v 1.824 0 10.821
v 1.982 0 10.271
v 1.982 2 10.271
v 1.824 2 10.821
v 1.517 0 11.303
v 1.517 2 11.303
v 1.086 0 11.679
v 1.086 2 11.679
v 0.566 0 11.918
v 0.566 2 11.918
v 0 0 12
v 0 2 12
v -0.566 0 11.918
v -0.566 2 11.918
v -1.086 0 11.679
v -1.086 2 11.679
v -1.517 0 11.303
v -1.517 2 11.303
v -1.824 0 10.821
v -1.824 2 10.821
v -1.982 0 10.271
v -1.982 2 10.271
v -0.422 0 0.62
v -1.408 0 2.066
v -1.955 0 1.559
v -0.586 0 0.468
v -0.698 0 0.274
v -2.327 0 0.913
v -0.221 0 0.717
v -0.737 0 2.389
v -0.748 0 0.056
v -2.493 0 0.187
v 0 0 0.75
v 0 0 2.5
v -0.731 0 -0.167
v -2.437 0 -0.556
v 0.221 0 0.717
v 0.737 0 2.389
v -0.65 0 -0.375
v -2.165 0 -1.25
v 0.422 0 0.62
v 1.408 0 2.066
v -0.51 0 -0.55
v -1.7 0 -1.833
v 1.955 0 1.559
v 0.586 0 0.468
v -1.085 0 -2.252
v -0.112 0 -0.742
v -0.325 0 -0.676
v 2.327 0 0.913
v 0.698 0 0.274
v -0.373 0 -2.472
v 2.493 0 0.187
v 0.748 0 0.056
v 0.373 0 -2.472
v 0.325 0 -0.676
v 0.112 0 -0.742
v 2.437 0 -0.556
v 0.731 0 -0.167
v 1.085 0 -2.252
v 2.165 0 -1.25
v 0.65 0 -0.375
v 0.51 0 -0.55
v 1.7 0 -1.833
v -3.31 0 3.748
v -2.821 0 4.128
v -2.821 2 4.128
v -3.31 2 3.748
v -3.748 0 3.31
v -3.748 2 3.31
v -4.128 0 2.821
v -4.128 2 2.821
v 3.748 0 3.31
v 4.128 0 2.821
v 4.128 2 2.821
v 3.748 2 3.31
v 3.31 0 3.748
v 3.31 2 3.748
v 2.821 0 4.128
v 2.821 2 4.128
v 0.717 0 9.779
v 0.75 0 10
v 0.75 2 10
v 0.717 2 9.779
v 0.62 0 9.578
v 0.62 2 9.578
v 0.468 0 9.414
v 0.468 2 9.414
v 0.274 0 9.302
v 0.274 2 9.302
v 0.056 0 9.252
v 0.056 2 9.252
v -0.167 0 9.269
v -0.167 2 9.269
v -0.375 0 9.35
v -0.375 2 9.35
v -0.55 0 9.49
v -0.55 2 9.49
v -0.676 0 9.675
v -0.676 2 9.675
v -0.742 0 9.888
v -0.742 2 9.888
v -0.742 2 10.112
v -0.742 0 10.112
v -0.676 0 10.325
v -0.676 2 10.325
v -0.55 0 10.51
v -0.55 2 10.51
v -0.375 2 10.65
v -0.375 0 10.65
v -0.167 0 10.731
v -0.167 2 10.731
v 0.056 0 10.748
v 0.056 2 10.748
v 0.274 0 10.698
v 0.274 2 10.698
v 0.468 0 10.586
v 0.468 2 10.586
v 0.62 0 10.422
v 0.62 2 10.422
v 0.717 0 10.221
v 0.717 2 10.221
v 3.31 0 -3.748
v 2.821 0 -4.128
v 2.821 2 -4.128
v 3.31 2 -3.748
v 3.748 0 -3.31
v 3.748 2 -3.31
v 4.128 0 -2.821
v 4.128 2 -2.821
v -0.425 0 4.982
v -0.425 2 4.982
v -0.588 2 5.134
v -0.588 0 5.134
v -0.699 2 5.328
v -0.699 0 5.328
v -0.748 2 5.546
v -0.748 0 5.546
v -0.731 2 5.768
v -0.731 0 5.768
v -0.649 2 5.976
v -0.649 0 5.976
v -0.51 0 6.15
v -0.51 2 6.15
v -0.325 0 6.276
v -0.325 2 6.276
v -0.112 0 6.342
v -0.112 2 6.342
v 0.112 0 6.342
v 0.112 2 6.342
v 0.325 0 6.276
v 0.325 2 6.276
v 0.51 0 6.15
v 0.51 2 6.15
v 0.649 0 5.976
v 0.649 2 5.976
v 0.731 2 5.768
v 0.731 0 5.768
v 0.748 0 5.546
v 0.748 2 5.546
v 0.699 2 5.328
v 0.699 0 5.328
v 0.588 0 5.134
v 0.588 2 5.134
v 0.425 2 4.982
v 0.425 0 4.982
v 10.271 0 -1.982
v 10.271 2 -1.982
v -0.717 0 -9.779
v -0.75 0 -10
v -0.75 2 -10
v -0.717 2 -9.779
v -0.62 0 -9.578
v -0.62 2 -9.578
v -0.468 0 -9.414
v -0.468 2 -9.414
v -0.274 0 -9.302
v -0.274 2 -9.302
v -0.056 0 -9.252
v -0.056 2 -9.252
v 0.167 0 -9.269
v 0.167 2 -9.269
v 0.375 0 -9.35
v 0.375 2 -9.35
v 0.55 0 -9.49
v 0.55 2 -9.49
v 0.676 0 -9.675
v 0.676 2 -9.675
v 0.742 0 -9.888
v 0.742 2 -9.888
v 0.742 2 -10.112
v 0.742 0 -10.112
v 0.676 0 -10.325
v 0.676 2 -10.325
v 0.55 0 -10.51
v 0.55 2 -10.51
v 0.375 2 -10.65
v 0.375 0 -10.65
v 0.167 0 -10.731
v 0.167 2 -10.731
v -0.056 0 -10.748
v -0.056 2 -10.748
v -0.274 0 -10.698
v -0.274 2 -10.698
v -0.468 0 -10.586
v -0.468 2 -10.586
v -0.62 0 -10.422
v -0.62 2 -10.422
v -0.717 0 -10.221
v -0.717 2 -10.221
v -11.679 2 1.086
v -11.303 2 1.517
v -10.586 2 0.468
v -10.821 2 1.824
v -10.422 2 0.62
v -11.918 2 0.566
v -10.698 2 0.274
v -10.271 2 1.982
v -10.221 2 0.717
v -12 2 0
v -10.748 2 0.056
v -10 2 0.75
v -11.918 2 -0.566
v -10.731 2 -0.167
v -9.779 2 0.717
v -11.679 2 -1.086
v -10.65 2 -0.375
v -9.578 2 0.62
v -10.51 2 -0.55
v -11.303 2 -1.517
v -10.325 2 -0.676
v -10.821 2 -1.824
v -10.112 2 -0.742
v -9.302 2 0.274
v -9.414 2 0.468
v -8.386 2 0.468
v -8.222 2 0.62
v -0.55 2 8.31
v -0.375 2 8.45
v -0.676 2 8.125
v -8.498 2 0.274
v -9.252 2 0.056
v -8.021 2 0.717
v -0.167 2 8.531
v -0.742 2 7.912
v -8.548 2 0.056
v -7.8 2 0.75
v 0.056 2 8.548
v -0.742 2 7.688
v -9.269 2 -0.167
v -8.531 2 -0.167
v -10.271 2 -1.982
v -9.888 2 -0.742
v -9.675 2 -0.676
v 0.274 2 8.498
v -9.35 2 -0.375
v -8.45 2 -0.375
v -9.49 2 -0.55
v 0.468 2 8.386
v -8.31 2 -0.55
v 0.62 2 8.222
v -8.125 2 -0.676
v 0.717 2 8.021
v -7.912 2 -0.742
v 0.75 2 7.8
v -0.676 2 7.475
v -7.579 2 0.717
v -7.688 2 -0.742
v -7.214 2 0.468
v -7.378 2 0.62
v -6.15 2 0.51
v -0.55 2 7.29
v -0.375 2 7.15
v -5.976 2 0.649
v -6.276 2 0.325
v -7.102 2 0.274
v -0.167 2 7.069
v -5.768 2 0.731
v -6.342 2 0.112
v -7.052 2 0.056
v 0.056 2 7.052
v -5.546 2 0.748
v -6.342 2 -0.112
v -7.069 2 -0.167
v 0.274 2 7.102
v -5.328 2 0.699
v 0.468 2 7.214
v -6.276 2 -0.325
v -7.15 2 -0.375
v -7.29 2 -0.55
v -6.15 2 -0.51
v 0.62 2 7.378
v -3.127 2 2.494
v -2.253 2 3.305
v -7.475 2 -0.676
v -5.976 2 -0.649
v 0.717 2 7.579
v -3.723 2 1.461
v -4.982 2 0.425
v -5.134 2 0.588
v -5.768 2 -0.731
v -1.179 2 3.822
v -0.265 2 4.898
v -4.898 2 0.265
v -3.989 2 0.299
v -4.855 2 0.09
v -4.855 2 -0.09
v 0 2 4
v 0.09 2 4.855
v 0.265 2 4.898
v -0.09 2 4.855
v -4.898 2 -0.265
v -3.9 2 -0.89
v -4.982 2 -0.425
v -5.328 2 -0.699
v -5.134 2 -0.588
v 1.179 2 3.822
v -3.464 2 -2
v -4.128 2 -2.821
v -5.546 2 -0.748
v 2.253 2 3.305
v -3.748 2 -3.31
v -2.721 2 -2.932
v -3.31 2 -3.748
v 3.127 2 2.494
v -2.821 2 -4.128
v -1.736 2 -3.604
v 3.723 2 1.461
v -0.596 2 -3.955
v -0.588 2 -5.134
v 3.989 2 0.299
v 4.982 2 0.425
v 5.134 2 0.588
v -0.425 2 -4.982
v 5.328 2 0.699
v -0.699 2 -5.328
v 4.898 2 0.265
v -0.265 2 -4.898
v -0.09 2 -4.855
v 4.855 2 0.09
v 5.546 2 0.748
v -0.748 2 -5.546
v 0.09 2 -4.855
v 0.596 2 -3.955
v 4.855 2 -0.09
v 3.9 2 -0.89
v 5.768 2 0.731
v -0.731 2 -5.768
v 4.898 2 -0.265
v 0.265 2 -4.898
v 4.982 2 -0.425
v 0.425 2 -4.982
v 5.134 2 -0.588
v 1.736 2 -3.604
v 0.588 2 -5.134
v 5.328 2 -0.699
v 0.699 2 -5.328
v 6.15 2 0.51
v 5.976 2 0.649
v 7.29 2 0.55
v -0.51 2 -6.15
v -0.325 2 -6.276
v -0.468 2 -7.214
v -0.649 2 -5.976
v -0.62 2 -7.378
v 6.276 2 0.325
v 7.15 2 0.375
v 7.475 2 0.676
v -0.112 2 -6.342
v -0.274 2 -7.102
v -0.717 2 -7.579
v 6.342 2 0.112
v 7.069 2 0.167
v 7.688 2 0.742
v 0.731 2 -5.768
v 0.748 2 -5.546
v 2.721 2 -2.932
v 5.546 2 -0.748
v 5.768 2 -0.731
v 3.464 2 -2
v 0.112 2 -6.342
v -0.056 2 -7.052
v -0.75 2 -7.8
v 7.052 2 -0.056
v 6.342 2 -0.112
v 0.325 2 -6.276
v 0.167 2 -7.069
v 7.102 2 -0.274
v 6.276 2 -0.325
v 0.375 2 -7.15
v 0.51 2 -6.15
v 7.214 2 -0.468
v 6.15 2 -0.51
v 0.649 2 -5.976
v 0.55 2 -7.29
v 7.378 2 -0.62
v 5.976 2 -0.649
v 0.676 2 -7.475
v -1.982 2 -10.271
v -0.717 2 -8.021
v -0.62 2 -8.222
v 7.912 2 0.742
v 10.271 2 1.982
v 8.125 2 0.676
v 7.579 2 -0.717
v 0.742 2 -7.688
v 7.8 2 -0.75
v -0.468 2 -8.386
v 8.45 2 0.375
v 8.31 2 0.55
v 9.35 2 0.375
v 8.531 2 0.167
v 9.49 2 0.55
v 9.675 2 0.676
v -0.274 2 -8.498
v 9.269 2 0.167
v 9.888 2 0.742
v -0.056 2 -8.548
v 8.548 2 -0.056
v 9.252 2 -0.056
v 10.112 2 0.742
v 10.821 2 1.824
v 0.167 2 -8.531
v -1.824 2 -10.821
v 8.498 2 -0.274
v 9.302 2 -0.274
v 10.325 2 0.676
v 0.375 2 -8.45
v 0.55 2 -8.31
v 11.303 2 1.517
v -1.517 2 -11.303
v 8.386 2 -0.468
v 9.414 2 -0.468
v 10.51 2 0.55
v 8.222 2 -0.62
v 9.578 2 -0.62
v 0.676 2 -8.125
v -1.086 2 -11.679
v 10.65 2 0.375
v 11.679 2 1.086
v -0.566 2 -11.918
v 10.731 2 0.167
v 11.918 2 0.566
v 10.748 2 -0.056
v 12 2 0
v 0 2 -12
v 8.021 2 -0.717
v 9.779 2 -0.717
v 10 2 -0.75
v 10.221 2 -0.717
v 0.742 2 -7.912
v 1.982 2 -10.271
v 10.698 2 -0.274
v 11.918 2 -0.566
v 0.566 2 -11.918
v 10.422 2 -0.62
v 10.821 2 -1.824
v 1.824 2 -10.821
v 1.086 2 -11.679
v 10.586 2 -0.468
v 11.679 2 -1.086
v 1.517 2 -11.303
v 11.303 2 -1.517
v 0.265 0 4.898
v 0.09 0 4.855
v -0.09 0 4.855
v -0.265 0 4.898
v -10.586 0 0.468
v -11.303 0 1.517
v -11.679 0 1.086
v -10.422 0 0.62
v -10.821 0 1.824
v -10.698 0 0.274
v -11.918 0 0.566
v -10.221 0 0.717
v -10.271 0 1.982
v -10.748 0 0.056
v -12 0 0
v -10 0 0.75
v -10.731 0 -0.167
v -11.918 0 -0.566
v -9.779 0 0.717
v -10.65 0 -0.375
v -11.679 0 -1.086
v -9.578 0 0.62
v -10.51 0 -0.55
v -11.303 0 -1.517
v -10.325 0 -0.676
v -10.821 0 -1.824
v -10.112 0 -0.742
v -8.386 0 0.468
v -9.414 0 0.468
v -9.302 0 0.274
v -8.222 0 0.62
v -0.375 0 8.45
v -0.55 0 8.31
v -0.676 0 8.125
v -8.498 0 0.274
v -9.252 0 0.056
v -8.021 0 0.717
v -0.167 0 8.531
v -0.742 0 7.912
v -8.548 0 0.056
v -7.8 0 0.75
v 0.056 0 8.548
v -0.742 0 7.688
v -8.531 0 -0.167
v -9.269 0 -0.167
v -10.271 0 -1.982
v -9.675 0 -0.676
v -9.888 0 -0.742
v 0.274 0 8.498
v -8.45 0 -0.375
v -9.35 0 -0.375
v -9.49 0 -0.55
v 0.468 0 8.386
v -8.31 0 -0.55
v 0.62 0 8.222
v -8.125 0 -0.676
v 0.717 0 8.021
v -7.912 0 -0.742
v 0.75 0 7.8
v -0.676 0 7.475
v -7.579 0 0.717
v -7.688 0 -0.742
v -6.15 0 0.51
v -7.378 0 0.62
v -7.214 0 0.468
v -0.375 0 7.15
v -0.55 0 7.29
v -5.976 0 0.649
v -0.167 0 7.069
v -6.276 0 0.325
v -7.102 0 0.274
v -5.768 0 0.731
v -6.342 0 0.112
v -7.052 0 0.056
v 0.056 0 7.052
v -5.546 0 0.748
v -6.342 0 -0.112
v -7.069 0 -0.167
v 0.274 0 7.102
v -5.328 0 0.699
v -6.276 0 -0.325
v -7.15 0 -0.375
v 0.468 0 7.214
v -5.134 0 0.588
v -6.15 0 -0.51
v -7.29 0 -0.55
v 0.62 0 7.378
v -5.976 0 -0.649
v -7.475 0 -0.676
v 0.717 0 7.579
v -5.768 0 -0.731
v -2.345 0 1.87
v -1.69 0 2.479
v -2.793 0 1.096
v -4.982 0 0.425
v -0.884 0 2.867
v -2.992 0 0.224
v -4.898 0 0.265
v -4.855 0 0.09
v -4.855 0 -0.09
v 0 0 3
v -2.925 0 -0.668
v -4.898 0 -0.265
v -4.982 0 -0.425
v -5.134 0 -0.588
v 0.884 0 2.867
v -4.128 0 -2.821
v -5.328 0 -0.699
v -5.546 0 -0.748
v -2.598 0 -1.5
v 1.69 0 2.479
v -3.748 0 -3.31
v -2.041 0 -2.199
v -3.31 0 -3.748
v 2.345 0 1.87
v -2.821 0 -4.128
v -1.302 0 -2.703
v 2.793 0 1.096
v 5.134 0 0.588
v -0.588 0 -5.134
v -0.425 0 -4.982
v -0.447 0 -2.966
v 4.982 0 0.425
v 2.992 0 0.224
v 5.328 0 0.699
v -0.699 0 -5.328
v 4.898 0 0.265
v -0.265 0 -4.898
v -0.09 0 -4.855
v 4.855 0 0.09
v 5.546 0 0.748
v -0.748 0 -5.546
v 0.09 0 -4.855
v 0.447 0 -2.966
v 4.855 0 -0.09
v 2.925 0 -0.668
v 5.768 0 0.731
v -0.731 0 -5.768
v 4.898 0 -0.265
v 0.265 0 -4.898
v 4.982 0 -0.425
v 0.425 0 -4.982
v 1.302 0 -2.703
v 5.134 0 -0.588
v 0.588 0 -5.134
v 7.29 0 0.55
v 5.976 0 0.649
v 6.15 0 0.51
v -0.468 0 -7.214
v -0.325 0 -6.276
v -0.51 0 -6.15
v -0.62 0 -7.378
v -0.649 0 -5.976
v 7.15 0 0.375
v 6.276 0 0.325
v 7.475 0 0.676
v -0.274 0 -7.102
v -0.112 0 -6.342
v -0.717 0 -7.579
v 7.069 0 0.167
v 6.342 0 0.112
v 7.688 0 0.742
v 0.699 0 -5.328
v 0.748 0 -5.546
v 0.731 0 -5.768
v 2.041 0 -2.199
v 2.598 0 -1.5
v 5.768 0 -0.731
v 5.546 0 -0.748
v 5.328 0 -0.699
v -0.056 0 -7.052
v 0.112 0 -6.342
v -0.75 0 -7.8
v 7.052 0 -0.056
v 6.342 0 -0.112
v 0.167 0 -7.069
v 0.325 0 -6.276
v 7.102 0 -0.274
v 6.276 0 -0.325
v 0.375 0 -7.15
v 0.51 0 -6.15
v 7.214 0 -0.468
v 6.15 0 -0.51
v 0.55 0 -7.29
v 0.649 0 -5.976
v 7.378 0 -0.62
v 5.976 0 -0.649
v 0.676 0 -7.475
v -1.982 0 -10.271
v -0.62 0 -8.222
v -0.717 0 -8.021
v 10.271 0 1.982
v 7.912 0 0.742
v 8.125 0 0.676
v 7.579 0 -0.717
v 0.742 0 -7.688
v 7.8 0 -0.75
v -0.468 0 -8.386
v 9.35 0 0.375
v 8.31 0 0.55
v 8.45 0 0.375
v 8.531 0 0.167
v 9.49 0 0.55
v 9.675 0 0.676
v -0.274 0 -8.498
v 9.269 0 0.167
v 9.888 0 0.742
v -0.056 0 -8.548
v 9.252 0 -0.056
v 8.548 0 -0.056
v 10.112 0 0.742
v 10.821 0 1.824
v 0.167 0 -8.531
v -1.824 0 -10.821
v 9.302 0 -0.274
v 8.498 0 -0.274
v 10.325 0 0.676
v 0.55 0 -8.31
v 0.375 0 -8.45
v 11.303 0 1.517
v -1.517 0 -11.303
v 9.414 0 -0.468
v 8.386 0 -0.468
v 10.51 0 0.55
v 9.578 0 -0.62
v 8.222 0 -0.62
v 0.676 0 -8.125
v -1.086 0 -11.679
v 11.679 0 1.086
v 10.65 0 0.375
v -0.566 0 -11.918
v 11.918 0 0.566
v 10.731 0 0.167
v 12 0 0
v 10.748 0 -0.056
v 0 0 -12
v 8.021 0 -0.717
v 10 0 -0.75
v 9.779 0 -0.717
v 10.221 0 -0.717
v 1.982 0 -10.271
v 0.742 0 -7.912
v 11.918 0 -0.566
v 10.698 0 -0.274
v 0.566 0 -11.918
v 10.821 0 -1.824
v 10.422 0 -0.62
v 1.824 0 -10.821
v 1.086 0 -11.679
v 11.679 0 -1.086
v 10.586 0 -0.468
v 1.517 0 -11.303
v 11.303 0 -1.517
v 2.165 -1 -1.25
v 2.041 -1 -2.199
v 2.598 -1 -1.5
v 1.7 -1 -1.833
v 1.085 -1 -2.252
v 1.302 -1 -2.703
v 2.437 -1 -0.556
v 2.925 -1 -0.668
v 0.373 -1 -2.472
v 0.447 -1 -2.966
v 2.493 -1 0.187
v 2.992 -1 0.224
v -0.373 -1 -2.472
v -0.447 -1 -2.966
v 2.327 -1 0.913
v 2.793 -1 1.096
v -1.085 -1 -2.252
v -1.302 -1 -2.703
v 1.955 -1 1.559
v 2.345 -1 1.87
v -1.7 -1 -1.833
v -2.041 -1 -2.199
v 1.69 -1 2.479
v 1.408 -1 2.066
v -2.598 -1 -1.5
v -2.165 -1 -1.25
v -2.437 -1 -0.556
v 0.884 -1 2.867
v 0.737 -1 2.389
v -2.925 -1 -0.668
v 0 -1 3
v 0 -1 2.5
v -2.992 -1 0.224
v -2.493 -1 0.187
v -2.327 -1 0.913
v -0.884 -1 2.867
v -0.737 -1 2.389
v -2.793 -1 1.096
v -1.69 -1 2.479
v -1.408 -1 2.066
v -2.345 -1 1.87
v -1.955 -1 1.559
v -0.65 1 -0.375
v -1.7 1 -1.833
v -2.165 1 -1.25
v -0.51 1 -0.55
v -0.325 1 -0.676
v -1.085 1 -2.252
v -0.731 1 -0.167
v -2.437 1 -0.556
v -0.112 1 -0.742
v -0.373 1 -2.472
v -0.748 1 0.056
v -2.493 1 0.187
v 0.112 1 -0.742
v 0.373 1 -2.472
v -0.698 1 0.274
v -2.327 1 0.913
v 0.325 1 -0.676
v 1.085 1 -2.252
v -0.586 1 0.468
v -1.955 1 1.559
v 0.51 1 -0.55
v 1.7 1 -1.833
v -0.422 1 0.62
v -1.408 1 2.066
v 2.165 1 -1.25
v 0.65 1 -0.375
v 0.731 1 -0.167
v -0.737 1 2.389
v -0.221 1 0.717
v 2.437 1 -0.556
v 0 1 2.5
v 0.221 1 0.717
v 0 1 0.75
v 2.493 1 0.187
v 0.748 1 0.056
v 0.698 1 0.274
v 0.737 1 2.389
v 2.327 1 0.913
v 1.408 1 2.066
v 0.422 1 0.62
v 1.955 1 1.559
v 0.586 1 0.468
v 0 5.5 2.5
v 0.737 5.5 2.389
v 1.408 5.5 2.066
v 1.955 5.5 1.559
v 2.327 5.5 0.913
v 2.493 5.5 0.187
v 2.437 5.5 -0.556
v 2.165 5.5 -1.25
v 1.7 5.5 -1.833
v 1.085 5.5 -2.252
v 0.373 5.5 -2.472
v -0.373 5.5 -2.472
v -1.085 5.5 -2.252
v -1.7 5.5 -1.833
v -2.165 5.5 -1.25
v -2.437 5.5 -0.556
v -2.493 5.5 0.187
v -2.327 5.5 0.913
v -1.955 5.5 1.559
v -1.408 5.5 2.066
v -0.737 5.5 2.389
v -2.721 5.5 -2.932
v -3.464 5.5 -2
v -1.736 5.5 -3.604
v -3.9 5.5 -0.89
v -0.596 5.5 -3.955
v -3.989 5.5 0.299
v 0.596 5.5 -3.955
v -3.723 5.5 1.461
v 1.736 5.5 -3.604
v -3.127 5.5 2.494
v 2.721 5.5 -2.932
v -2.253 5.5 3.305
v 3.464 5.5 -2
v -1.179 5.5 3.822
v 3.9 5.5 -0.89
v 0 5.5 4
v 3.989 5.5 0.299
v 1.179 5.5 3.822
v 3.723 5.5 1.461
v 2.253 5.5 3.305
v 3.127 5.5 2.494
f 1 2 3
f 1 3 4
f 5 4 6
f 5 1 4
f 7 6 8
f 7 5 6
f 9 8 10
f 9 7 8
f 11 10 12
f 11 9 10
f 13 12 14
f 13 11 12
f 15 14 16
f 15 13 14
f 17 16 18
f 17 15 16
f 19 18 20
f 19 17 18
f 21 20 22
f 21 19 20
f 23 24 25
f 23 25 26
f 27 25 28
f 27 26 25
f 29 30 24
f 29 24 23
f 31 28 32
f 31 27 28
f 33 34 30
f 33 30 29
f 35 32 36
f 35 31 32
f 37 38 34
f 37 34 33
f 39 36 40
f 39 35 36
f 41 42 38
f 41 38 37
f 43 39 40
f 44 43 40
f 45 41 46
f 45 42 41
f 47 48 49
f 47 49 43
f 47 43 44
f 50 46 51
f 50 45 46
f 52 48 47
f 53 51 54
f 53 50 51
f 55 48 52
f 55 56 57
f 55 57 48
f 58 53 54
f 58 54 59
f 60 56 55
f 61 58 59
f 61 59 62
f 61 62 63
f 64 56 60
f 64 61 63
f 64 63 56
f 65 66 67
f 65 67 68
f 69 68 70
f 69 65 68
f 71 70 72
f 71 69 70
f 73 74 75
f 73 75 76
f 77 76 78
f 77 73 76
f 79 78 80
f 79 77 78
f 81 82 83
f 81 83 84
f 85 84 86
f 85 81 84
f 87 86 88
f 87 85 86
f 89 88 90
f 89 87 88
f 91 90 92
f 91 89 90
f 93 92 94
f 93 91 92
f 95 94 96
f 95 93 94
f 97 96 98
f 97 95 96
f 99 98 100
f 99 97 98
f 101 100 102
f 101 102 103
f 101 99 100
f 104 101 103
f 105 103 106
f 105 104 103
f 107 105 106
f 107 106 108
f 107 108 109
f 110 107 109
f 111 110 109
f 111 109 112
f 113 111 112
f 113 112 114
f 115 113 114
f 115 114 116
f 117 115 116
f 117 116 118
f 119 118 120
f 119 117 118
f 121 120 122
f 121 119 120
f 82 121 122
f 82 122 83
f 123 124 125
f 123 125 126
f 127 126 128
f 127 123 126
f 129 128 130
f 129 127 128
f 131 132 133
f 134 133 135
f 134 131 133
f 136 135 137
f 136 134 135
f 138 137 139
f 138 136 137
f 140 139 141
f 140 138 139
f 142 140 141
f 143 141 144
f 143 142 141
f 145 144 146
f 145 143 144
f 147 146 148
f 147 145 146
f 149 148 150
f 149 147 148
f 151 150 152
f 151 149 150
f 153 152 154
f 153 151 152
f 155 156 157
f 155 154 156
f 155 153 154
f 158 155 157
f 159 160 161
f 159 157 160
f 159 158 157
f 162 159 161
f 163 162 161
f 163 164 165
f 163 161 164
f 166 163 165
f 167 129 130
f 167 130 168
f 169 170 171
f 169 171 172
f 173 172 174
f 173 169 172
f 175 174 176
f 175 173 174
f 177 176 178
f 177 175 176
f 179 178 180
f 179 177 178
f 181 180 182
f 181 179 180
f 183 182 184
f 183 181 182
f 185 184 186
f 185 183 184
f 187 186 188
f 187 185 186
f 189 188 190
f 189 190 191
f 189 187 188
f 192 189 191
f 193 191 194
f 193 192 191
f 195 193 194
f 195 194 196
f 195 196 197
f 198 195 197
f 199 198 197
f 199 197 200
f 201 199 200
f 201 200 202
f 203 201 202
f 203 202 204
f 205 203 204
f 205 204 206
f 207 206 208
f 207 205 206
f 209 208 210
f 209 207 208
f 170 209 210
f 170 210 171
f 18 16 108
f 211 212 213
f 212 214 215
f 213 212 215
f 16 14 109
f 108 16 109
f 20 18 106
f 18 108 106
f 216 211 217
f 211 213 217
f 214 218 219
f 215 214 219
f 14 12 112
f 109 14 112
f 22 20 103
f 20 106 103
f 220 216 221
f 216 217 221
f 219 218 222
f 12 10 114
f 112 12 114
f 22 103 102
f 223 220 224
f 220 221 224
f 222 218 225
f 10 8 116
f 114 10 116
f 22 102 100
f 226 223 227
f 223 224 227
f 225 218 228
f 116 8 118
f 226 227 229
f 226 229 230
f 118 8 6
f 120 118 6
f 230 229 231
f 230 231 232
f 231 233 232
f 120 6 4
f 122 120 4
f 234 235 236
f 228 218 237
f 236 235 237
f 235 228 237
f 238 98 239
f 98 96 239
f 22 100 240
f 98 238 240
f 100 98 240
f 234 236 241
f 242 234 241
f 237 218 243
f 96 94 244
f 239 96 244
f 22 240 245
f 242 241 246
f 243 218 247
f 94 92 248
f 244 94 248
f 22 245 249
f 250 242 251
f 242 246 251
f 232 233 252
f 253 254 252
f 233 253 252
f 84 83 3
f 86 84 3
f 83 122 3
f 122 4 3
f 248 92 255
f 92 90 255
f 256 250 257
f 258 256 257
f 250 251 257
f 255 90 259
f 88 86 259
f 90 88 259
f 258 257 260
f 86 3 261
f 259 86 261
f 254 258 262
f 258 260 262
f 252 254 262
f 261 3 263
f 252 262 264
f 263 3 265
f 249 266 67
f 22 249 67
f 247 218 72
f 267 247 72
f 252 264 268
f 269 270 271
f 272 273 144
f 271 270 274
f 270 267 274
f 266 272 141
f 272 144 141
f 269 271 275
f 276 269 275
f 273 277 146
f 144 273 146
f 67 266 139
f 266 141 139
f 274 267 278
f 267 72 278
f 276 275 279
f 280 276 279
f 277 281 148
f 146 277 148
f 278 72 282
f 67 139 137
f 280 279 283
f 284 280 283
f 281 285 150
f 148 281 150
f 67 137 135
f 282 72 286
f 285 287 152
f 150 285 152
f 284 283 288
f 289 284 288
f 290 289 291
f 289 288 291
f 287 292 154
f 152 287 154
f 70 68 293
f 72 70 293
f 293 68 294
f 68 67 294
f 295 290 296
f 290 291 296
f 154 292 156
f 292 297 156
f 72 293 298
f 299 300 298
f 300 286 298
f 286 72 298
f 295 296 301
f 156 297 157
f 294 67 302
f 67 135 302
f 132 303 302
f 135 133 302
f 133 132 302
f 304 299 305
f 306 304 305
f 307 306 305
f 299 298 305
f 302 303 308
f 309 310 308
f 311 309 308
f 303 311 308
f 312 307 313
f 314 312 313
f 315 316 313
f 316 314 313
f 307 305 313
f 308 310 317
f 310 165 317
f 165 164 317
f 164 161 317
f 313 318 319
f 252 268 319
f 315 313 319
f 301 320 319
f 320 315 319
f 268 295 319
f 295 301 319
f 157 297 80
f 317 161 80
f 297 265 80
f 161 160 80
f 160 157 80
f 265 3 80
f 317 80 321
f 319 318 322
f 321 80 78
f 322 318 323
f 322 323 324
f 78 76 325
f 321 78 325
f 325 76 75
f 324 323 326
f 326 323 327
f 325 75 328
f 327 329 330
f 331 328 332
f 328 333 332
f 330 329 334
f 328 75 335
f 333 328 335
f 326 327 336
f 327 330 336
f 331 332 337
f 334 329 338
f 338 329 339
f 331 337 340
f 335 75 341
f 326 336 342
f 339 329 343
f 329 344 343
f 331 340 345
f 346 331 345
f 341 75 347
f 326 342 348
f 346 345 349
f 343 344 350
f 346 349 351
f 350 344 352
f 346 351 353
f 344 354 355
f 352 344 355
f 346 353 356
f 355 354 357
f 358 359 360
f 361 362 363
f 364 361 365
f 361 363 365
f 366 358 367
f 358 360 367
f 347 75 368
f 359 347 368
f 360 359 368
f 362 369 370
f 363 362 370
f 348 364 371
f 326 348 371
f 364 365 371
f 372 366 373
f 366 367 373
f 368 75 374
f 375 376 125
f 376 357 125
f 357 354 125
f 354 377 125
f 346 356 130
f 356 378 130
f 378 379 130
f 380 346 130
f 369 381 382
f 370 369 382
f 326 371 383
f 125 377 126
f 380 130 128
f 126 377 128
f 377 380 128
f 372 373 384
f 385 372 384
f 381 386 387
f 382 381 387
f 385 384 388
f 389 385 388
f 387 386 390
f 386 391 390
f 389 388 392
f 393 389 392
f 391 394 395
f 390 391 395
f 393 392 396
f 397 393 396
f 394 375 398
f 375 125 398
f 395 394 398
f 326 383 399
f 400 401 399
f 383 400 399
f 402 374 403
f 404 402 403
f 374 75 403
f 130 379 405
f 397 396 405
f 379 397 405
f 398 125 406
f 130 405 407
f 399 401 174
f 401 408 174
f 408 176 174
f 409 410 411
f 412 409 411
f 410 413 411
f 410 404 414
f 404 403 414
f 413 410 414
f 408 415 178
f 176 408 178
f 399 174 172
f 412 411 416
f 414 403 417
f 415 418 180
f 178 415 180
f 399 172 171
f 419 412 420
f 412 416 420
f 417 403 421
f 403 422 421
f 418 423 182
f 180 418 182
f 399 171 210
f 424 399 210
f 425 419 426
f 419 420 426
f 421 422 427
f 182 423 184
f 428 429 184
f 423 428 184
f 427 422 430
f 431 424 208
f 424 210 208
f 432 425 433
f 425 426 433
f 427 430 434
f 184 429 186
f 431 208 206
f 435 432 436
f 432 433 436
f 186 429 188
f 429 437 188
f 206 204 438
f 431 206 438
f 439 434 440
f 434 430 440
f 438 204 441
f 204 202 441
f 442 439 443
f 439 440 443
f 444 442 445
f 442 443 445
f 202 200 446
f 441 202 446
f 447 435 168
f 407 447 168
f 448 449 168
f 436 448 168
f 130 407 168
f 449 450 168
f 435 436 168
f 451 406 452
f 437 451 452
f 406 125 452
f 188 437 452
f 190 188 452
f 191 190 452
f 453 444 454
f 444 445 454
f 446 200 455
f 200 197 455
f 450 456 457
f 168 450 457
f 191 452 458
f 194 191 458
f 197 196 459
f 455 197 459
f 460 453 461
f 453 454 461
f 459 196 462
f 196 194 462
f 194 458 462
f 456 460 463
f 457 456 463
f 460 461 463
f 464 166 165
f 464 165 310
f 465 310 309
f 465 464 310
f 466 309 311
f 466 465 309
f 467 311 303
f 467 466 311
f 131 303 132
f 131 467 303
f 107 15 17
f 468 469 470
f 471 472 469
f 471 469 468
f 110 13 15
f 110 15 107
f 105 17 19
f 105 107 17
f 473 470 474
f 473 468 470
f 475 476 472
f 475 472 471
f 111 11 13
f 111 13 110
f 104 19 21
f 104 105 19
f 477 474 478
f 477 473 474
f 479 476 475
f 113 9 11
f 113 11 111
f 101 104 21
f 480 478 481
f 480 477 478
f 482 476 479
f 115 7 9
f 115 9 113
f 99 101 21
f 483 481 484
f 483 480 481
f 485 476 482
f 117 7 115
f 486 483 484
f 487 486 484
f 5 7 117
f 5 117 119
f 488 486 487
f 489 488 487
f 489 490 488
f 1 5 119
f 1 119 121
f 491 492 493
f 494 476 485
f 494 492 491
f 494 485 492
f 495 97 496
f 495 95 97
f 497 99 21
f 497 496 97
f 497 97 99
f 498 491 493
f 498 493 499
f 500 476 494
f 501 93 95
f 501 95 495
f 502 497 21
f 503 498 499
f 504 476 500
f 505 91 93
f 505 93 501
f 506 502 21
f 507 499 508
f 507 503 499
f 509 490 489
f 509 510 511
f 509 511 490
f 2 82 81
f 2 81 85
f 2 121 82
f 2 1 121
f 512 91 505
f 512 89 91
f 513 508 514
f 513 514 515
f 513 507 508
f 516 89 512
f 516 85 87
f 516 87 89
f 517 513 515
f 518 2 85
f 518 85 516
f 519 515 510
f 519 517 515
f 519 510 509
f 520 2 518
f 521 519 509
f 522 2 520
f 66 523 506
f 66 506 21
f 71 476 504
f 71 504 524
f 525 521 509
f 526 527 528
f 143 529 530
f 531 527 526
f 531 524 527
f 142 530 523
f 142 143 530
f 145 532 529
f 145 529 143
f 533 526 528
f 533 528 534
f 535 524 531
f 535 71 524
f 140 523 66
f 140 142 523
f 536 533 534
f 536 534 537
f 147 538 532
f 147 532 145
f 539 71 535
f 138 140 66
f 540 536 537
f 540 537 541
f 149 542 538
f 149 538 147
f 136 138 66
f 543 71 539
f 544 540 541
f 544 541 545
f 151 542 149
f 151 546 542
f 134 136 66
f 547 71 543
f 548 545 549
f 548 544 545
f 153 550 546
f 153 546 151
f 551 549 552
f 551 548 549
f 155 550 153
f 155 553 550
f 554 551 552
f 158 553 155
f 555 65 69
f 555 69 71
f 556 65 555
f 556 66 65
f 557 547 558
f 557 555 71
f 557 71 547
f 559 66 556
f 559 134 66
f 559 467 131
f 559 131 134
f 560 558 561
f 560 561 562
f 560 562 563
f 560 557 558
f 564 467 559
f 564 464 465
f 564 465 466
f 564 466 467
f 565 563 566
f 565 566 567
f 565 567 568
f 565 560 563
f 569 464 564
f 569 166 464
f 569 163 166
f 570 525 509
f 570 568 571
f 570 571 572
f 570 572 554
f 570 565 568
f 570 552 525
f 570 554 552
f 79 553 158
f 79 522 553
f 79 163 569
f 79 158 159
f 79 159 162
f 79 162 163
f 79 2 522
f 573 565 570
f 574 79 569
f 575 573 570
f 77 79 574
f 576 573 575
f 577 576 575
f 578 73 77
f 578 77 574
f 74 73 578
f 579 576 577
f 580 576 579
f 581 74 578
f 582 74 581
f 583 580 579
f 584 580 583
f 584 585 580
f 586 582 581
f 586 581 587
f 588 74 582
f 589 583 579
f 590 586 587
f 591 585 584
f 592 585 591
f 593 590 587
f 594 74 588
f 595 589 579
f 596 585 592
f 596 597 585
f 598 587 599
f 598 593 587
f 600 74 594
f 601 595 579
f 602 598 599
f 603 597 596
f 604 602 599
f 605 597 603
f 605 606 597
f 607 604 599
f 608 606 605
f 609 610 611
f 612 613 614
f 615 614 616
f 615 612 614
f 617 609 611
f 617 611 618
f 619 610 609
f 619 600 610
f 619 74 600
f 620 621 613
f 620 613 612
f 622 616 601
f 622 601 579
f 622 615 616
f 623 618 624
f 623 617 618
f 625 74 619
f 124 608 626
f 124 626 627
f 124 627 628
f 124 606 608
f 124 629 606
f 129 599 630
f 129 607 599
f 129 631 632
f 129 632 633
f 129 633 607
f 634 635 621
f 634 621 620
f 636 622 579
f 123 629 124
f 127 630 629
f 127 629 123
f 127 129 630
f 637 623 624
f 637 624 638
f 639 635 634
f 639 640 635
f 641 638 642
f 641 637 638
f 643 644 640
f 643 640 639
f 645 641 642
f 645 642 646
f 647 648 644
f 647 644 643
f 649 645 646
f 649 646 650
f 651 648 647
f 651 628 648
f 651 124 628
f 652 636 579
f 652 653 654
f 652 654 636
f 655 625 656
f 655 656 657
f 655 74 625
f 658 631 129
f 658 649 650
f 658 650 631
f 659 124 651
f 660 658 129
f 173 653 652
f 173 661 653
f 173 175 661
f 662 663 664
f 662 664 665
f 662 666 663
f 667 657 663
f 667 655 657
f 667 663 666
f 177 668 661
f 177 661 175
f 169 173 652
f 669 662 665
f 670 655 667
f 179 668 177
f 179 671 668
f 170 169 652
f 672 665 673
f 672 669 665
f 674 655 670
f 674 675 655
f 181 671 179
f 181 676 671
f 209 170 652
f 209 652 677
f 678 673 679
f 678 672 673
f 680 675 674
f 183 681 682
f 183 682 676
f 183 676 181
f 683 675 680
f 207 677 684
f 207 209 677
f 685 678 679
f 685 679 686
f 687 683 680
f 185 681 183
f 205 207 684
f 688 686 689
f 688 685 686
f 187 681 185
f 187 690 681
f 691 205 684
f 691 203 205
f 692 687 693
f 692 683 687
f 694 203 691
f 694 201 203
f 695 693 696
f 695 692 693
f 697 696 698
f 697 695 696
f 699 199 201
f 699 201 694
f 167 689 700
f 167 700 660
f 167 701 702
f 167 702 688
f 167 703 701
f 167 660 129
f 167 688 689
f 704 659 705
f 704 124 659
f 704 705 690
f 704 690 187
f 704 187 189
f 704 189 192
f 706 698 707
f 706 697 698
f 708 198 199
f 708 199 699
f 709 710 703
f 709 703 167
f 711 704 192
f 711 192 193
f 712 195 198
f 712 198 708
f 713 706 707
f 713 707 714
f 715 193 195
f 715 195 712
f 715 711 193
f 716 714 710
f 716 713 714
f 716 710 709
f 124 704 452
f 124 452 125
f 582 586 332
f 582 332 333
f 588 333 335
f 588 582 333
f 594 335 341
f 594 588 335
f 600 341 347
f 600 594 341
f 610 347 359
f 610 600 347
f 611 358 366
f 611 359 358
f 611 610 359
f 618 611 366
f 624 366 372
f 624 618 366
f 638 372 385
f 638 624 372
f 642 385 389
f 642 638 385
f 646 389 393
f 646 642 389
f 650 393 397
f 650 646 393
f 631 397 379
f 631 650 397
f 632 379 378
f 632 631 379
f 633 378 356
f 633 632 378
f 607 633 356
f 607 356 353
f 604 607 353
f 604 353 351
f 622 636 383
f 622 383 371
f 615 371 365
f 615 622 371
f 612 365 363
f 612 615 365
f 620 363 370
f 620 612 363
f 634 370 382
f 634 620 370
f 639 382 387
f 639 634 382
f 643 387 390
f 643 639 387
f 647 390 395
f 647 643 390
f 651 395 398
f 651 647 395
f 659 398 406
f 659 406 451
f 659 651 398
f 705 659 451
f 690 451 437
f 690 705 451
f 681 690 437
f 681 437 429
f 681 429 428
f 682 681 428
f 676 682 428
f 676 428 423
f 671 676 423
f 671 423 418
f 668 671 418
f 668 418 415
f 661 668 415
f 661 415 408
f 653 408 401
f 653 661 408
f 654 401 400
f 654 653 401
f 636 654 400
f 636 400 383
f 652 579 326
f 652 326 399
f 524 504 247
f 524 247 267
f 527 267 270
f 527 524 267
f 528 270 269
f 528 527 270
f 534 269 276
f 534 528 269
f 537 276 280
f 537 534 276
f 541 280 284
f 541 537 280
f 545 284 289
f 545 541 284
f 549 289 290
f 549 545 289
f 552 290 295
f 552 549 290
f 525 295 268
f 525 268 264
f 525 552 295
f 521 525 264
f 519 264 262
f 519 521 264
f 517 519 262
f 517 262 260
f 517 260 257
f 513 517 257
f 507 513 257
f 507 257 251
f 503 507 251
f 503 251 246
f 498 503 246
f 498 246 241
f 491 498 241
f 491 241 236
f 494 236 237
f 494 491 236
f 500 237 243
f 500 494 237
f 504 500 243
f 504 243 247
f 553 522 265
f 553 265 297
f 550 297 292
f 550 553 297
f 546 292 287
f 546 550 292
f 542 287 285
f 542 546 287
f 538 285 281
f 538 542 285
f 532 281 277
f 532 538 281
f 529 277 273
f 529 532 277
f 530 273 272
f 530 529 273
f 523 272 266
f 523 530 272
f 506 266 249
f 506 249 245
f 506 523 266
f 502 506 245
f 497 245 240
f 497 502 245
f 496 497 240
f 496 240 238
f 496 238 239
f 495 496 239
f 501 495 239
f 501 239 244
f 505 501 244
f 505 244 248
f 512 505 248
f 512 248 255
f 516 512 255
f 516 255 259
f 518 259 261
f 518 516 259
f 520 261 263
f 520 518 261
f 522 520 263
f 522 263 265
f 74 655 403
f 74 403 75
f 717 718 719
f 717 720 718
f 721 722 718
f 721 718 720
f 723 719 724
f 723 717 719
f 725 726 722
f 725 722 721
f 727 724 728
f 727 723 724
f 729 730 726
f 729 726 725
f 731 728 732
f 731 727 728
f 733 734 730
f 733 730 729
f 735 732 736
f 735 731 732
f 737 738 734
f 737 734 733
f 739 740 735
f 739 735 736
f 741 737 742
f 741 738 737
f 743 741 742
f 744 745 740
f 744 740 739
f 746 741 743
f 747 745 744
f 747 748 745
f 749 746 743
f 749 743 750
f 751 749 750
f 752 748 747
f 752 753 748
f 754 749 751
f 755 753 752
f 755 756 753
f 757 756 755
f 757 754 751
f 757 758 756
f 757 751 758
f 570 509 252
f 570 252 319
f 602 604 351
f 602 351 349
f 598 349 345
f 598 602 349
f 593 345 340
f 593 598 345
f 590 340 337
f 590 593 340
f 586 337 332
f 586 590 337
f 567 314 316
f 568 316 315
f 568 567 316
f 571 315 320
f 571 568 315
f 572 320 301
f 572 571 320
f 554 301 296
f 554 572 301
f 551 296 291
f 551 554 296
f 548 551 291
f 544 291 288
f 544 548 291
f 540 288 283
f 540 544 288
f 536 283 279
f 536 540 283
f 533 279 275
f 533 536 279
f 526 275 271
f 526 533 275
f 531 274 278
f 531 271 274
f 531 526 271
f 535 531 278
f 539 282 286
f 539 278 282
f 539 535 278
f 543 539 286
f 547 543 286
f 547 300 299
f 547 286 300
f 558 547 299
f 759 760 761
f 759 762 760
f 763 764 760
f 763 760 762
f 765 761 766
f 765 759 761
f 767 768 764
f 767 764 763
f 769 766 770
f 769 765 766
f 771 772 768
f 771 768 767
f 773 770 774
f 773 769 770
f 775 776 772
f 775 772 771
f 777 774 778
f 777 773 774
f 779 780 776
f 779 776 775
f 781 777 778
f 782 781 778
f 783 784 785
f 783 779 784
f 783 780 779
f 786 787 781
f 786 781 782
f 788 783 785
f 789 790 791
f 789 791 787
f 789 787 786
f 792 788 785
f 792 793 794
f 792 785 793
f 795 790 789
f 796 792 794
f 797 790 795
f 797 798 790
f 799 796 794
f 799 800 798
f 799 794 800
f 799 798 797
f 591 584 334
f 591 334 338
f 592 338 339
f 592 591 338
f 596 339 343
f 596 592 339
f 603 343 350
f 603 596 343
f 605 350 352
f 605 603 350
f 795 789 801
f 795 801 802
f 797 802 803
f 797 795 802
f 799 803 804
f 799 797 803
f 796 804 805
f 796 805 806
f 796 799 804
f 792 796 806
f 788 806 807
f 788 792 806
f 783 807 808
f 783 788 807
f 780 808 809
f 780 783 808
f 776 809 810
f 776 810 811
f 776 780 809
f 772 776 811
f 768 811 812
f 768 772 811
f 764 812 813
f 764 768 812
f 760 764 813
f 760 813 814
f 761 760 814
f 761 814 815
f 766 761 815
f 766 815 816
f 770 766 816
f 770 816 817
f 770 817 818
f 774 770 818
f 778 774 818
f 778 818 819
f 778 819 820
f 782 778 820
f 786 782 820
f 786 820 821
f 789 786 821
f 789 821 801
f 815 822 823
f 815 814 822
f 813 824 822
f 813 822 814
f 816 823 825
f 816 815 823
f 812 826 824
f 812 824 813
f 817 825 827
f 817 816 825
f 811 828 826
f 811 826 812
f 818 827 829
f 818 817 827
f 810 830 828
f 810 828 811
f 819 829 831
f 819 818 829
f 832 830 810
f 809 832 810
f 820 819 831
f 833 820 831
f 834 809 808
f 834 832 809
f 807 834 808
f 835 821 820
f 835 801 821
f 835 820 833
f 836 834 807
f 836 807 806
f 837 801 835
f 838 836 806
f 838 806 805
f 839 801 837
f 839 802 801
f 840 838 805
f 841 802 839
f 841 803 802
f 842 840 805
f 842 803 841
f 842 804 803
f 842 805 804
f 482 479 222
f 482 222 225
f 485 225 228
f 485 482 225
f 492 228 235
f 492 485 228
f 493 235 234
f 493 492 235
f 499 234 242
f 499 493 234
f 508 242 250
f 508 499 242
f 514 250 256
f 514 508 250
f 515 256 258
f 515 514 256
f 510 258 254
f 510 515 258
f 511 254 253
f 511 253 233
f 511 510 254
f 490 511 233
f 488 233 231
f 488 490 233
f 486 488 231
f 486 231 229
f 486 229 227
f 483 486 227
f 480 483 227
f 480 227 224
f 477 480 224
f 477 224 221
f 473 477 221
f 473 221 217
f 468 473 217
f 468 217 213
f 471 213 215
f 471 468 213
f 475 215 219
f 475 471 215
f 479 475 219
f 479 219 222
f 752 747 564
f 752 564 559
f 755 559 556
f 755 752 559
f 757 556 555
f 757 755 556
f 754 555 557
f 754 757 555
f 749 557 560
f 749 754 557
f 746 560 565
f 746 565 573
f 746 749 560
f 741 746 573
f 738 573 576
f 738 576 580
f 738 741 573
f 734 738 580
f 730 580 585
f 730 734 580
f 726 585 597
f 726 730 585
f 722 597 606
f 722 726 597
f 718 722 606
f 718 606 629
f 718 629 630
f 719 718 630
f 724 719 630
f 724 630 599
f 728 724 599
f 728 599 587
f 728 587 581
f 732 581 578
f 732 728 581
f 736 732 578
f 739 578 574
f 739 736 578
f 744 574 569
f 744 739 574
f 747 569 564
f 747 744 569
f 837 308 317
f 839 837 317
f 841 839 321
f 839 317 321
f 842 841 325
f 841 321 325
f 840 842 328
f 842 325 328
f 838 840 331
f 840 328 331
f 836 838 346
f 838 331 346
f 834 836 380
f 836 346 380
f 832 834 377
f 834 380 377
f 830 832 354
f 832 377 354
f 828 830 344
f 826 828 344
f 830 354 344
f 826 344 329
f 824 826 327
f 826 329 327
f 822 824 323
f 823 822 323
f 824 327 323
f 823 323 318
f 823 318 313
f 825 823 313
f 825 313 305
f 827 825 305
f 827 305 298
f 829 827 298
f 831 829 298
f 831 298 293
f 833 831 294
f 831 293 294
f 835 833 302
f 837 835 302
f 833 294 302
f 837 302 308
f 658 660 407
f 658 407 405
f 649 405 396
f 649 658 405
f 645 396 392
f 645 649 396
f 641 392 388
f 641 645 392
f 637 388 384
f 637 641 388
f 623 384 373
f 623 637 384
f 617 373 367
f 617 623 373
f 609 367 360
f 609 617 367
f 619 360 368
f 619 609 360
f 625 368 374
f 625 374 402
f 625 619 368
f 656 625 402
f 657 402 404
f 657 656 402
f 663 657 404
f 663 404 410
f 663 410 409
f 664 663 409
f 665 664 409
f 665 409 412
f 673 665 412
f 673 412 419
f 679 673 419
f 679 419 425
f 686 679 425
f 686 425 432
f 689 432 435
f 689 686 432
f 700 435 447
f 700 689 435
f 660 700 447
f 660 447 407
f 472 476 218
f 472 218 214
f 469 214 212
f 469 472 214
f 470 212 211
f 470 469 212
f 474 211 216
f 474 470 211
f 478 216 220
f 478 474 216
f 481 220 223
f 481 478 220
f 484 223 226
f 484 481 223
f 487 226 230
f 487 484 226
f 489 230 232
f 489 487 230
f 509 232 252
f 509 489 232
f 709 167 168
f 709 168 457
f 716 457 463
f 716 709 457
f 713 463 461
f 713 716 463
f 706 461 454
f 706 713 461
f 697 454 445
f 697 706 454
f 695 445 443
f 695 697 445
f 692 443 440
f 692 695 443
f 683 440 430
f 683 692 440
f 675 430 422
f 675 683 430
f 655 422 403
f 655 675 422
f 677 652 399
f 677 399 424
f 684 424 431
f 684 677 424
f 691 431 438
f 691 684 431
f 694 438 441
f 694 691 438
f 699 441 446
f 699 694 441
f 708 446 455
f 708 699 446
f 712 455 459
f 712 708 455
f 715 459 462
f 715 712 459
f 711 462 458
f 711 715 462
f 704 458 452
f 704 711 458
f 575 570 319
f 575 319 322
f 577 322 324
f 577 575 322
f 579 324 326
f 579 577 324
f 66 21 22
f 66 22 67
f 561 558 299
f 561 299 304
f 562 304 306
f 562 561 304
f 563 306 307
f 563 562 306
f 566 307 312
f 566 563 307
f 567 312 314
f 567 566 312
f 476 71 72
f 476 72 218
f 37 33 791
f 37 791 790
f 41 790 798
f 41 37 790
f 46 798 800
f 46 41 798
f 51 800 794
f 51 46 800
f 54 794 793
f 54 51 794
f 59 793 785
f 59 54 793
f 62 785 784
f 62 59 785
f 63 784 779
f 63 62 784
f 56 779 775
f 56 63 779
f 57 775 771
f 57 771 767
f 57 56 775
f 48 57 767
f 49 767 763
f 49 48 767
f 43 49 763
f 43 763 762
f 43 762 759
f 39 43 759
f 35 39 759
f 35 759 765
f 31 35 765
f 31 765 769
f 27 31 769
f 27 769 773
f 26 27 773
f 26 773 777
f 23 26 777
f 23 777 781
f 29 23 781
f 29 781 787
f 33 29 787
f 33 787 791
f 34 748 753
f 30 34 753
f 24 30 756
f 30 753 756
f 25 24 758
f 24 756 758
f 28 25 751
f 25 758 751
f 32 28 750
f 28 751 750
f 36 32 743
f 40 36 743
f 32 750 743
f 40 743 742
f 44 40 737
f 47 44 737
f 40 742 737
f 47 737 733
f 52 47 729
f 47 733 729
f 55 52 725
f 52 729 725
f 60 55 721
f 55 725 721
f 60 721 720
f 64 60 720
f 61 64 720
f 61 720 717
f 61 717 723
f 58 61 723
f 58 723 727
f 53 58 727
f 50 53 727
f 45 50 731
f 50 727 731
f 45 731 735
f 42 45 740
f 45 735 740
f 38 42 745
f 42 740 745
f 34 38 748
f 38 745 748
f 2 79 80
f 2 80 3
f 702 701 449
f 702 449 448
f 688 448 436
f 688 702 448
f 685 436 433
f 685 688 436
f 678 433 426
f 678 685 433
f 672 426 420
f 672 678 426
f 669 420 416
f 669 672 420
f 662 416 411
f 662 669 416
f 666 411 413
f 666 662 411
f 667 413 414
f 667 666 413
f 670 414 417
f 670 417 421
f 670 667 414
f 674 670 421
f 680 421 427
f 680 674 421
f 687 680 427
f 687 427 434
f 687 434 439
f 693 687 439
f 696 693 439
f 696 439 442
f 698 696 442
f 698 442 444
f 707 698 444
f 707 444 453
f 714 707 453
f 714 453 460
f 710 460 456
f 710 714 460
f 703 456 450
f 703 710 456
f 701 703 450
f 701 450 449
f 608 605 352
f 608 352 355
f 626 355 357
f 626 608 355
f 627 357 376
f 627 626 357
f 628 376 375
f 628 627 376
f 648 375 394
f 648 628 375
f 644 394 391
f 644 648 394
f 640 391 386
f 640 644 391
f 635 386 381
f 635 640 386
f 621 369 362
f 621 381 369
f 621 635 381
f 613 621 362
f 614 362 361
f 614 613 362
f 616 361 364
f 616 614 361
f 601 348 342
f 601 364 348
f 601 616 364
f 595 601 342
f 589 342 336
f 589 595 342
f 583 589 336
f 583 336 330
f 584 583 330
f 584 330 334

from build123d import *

# Parameters (mm, degrees)
ESBO_O2_R                = 0.75
RESSALTO_EXTRUS_O1_DEPTH = 2
PADR_OCIRCULAR1_COUNT    = 4
ESBO_O3_R                = 4
ESBO_O3_R_2              = 2.5
RESSALTO_EXTRUS_O2_DEPTH = 3.5
CORTE_EXTRUS_O1_START    = -1
ESBO_O4_R                = 2.5
ESBO_O4_R_2              = 0.75
CORTE_EXTRUS_O1_DEPTH    = 1
RESSALTO_EXTRUS_O3_START = 1
ESBO_O5_R                = 3
ESBO_O5_R_2              = 2.5
RESSALTO_EXTRUS_O3_DEPTH = 1


with BuildPart() as part:
    # Esboço2 → Ressalto-extrusão1 (new body)
    with BuildSketch(Plane(origin=(0, 0, 0), x_dir=(1, 0, 0), z_dir=(0, 1, 0))):
        with BuildLine():
            Line((-10.270723649, 1.981592467), (-4.128356106, 2.82075803))
            ThreePointArc((-4.128356106, 2.82075803), (-2.520023904, 4.318504316), (-0.424825461, 4.981919643))
            ThreePointArc((-0.424825461, 4.981919643), (0, 4.85), (0.424825461, 4.981919643))
            ThreePointArc((0.424825461, 4.981919643), (3.535533906, 3.535533906), (4.981919643, 0.424825461))
            ThreePointArc((4.981919643, 0.424825461), (4.85, 0), (4.981919643, -0.424825461))
            ThreePointArc((4.981919643, -0.424825461), (3.535533906, -3.535533906), (0.424825461, -4.981919643))
            ThreePointArc((0.424825461, -4.981919643), (0, -4.85), (-0.424825461, -4.981919643))
            ThreePointArc((-0.424825461, -4.981919643), (-2.520023904, -4.318504316), (-4.128356106, -2.82075803))
            Line((-4.128356106, -2.82075803), (-10.270723649, -1.981592467))
            ThreePointArc((-10.270723649, -1.981592467), (-12, 0), (-10.270723649, 1.981592467))
        make_face()
        with Locations(Location((0, 0, 0), (0, 0, 270))):
            Circle(ESBO_O2_R, mode=Mode.SUBTRACT)
        with Locations(Location((-5.6, 0, 0), (0, 0, 270))):
            Circle(ESBO_O2_R, mode=Mode.SUBTRACT)
        with Locations(Location((-7.8, 0, 0), (0, 0, 270))):
            Circle(ESBO_O2_R, mode=Mode.SUBTRACT)
        with Locations(Location((-10, 0, 0), (0, 0, 270))):
            Circle(ESBO_O2_R, mode=Mode.SUBTRACT)
    ressalto_extrus_o1 = extrude(amount=RESSALTO_EXTRUS_O1_DEPTH)

    # PadrãoCircular1: Ressalto-extrusão1 ×4 about axis
    padr_ocircular1_axis = Axis((0, 0, 0), (0, 1, 0))
    for i in range(1, PADR_OCIRCULAR1_COUNT):
        add(ressalto_extrus_o1.rotate(padr_ocircular1_axis, i * 360 / PADR_OCIRCULAR1_COUNT))

    # Esboço3 → Ressalto-extrusão2 (add)
    with BuildSketch(Plane(origin=(0, 2, 0), x_dir=(1, 0, 0), z_dir=(0, 1, 0))):
        with Locations(Location((0, 0, 0), (0, 0, 270))):
            Circle(ESBO_O3_R)
        with Locations(Location((0, 0, 0), (0, 0, 270))):
            Circle(ESBO_O3_R_2, mode=Mode.SUBTRACT)
    extrude(amount=RESSALTO_EXTRUS_O2_DEPTH)

    # Esboço4 → Corte-extrusão1 (cut)
    with BuildSketch(Plane(origin=(0, 2, 0), x_dir=(1, 0, 0), z_dir=(0, 1, 0)).offset(CORTE_EXTRUS_O1_START)):
        with Locations(Location((0, 0, 0), (0, 0, 270))):
            Circle(ESBO_O4_R)
        with Locations(Location((0, 0, 0), (0, 0, 270))):
            Circle(ESBO_O4_R_2, mode=Mode.SUBTRACT)
    extrude(amount=CORTE_EXTRUS_O1_DEPTH, mode=Mode.SUBTRACT)

    # Esboço5 → Ressalto-extrusão3 (add)
    with BuildSketch(Plane.XZ.offset(RESSALTO_EXTRUS_O3_START)):
        with Locations(Location((0, 0, 0), (0, 0, 90))):
            Circle(ESBO_O5_R)
        with Locations(Location((0, 0, 0), (0, 0, 90))):
            Circle(ESBO_O5_R_2, mode=Mode.SUBTRACT)
    extrude(amount=-RESSALTO_EXTRUS_O3_DEPTH)


solid = part.part
